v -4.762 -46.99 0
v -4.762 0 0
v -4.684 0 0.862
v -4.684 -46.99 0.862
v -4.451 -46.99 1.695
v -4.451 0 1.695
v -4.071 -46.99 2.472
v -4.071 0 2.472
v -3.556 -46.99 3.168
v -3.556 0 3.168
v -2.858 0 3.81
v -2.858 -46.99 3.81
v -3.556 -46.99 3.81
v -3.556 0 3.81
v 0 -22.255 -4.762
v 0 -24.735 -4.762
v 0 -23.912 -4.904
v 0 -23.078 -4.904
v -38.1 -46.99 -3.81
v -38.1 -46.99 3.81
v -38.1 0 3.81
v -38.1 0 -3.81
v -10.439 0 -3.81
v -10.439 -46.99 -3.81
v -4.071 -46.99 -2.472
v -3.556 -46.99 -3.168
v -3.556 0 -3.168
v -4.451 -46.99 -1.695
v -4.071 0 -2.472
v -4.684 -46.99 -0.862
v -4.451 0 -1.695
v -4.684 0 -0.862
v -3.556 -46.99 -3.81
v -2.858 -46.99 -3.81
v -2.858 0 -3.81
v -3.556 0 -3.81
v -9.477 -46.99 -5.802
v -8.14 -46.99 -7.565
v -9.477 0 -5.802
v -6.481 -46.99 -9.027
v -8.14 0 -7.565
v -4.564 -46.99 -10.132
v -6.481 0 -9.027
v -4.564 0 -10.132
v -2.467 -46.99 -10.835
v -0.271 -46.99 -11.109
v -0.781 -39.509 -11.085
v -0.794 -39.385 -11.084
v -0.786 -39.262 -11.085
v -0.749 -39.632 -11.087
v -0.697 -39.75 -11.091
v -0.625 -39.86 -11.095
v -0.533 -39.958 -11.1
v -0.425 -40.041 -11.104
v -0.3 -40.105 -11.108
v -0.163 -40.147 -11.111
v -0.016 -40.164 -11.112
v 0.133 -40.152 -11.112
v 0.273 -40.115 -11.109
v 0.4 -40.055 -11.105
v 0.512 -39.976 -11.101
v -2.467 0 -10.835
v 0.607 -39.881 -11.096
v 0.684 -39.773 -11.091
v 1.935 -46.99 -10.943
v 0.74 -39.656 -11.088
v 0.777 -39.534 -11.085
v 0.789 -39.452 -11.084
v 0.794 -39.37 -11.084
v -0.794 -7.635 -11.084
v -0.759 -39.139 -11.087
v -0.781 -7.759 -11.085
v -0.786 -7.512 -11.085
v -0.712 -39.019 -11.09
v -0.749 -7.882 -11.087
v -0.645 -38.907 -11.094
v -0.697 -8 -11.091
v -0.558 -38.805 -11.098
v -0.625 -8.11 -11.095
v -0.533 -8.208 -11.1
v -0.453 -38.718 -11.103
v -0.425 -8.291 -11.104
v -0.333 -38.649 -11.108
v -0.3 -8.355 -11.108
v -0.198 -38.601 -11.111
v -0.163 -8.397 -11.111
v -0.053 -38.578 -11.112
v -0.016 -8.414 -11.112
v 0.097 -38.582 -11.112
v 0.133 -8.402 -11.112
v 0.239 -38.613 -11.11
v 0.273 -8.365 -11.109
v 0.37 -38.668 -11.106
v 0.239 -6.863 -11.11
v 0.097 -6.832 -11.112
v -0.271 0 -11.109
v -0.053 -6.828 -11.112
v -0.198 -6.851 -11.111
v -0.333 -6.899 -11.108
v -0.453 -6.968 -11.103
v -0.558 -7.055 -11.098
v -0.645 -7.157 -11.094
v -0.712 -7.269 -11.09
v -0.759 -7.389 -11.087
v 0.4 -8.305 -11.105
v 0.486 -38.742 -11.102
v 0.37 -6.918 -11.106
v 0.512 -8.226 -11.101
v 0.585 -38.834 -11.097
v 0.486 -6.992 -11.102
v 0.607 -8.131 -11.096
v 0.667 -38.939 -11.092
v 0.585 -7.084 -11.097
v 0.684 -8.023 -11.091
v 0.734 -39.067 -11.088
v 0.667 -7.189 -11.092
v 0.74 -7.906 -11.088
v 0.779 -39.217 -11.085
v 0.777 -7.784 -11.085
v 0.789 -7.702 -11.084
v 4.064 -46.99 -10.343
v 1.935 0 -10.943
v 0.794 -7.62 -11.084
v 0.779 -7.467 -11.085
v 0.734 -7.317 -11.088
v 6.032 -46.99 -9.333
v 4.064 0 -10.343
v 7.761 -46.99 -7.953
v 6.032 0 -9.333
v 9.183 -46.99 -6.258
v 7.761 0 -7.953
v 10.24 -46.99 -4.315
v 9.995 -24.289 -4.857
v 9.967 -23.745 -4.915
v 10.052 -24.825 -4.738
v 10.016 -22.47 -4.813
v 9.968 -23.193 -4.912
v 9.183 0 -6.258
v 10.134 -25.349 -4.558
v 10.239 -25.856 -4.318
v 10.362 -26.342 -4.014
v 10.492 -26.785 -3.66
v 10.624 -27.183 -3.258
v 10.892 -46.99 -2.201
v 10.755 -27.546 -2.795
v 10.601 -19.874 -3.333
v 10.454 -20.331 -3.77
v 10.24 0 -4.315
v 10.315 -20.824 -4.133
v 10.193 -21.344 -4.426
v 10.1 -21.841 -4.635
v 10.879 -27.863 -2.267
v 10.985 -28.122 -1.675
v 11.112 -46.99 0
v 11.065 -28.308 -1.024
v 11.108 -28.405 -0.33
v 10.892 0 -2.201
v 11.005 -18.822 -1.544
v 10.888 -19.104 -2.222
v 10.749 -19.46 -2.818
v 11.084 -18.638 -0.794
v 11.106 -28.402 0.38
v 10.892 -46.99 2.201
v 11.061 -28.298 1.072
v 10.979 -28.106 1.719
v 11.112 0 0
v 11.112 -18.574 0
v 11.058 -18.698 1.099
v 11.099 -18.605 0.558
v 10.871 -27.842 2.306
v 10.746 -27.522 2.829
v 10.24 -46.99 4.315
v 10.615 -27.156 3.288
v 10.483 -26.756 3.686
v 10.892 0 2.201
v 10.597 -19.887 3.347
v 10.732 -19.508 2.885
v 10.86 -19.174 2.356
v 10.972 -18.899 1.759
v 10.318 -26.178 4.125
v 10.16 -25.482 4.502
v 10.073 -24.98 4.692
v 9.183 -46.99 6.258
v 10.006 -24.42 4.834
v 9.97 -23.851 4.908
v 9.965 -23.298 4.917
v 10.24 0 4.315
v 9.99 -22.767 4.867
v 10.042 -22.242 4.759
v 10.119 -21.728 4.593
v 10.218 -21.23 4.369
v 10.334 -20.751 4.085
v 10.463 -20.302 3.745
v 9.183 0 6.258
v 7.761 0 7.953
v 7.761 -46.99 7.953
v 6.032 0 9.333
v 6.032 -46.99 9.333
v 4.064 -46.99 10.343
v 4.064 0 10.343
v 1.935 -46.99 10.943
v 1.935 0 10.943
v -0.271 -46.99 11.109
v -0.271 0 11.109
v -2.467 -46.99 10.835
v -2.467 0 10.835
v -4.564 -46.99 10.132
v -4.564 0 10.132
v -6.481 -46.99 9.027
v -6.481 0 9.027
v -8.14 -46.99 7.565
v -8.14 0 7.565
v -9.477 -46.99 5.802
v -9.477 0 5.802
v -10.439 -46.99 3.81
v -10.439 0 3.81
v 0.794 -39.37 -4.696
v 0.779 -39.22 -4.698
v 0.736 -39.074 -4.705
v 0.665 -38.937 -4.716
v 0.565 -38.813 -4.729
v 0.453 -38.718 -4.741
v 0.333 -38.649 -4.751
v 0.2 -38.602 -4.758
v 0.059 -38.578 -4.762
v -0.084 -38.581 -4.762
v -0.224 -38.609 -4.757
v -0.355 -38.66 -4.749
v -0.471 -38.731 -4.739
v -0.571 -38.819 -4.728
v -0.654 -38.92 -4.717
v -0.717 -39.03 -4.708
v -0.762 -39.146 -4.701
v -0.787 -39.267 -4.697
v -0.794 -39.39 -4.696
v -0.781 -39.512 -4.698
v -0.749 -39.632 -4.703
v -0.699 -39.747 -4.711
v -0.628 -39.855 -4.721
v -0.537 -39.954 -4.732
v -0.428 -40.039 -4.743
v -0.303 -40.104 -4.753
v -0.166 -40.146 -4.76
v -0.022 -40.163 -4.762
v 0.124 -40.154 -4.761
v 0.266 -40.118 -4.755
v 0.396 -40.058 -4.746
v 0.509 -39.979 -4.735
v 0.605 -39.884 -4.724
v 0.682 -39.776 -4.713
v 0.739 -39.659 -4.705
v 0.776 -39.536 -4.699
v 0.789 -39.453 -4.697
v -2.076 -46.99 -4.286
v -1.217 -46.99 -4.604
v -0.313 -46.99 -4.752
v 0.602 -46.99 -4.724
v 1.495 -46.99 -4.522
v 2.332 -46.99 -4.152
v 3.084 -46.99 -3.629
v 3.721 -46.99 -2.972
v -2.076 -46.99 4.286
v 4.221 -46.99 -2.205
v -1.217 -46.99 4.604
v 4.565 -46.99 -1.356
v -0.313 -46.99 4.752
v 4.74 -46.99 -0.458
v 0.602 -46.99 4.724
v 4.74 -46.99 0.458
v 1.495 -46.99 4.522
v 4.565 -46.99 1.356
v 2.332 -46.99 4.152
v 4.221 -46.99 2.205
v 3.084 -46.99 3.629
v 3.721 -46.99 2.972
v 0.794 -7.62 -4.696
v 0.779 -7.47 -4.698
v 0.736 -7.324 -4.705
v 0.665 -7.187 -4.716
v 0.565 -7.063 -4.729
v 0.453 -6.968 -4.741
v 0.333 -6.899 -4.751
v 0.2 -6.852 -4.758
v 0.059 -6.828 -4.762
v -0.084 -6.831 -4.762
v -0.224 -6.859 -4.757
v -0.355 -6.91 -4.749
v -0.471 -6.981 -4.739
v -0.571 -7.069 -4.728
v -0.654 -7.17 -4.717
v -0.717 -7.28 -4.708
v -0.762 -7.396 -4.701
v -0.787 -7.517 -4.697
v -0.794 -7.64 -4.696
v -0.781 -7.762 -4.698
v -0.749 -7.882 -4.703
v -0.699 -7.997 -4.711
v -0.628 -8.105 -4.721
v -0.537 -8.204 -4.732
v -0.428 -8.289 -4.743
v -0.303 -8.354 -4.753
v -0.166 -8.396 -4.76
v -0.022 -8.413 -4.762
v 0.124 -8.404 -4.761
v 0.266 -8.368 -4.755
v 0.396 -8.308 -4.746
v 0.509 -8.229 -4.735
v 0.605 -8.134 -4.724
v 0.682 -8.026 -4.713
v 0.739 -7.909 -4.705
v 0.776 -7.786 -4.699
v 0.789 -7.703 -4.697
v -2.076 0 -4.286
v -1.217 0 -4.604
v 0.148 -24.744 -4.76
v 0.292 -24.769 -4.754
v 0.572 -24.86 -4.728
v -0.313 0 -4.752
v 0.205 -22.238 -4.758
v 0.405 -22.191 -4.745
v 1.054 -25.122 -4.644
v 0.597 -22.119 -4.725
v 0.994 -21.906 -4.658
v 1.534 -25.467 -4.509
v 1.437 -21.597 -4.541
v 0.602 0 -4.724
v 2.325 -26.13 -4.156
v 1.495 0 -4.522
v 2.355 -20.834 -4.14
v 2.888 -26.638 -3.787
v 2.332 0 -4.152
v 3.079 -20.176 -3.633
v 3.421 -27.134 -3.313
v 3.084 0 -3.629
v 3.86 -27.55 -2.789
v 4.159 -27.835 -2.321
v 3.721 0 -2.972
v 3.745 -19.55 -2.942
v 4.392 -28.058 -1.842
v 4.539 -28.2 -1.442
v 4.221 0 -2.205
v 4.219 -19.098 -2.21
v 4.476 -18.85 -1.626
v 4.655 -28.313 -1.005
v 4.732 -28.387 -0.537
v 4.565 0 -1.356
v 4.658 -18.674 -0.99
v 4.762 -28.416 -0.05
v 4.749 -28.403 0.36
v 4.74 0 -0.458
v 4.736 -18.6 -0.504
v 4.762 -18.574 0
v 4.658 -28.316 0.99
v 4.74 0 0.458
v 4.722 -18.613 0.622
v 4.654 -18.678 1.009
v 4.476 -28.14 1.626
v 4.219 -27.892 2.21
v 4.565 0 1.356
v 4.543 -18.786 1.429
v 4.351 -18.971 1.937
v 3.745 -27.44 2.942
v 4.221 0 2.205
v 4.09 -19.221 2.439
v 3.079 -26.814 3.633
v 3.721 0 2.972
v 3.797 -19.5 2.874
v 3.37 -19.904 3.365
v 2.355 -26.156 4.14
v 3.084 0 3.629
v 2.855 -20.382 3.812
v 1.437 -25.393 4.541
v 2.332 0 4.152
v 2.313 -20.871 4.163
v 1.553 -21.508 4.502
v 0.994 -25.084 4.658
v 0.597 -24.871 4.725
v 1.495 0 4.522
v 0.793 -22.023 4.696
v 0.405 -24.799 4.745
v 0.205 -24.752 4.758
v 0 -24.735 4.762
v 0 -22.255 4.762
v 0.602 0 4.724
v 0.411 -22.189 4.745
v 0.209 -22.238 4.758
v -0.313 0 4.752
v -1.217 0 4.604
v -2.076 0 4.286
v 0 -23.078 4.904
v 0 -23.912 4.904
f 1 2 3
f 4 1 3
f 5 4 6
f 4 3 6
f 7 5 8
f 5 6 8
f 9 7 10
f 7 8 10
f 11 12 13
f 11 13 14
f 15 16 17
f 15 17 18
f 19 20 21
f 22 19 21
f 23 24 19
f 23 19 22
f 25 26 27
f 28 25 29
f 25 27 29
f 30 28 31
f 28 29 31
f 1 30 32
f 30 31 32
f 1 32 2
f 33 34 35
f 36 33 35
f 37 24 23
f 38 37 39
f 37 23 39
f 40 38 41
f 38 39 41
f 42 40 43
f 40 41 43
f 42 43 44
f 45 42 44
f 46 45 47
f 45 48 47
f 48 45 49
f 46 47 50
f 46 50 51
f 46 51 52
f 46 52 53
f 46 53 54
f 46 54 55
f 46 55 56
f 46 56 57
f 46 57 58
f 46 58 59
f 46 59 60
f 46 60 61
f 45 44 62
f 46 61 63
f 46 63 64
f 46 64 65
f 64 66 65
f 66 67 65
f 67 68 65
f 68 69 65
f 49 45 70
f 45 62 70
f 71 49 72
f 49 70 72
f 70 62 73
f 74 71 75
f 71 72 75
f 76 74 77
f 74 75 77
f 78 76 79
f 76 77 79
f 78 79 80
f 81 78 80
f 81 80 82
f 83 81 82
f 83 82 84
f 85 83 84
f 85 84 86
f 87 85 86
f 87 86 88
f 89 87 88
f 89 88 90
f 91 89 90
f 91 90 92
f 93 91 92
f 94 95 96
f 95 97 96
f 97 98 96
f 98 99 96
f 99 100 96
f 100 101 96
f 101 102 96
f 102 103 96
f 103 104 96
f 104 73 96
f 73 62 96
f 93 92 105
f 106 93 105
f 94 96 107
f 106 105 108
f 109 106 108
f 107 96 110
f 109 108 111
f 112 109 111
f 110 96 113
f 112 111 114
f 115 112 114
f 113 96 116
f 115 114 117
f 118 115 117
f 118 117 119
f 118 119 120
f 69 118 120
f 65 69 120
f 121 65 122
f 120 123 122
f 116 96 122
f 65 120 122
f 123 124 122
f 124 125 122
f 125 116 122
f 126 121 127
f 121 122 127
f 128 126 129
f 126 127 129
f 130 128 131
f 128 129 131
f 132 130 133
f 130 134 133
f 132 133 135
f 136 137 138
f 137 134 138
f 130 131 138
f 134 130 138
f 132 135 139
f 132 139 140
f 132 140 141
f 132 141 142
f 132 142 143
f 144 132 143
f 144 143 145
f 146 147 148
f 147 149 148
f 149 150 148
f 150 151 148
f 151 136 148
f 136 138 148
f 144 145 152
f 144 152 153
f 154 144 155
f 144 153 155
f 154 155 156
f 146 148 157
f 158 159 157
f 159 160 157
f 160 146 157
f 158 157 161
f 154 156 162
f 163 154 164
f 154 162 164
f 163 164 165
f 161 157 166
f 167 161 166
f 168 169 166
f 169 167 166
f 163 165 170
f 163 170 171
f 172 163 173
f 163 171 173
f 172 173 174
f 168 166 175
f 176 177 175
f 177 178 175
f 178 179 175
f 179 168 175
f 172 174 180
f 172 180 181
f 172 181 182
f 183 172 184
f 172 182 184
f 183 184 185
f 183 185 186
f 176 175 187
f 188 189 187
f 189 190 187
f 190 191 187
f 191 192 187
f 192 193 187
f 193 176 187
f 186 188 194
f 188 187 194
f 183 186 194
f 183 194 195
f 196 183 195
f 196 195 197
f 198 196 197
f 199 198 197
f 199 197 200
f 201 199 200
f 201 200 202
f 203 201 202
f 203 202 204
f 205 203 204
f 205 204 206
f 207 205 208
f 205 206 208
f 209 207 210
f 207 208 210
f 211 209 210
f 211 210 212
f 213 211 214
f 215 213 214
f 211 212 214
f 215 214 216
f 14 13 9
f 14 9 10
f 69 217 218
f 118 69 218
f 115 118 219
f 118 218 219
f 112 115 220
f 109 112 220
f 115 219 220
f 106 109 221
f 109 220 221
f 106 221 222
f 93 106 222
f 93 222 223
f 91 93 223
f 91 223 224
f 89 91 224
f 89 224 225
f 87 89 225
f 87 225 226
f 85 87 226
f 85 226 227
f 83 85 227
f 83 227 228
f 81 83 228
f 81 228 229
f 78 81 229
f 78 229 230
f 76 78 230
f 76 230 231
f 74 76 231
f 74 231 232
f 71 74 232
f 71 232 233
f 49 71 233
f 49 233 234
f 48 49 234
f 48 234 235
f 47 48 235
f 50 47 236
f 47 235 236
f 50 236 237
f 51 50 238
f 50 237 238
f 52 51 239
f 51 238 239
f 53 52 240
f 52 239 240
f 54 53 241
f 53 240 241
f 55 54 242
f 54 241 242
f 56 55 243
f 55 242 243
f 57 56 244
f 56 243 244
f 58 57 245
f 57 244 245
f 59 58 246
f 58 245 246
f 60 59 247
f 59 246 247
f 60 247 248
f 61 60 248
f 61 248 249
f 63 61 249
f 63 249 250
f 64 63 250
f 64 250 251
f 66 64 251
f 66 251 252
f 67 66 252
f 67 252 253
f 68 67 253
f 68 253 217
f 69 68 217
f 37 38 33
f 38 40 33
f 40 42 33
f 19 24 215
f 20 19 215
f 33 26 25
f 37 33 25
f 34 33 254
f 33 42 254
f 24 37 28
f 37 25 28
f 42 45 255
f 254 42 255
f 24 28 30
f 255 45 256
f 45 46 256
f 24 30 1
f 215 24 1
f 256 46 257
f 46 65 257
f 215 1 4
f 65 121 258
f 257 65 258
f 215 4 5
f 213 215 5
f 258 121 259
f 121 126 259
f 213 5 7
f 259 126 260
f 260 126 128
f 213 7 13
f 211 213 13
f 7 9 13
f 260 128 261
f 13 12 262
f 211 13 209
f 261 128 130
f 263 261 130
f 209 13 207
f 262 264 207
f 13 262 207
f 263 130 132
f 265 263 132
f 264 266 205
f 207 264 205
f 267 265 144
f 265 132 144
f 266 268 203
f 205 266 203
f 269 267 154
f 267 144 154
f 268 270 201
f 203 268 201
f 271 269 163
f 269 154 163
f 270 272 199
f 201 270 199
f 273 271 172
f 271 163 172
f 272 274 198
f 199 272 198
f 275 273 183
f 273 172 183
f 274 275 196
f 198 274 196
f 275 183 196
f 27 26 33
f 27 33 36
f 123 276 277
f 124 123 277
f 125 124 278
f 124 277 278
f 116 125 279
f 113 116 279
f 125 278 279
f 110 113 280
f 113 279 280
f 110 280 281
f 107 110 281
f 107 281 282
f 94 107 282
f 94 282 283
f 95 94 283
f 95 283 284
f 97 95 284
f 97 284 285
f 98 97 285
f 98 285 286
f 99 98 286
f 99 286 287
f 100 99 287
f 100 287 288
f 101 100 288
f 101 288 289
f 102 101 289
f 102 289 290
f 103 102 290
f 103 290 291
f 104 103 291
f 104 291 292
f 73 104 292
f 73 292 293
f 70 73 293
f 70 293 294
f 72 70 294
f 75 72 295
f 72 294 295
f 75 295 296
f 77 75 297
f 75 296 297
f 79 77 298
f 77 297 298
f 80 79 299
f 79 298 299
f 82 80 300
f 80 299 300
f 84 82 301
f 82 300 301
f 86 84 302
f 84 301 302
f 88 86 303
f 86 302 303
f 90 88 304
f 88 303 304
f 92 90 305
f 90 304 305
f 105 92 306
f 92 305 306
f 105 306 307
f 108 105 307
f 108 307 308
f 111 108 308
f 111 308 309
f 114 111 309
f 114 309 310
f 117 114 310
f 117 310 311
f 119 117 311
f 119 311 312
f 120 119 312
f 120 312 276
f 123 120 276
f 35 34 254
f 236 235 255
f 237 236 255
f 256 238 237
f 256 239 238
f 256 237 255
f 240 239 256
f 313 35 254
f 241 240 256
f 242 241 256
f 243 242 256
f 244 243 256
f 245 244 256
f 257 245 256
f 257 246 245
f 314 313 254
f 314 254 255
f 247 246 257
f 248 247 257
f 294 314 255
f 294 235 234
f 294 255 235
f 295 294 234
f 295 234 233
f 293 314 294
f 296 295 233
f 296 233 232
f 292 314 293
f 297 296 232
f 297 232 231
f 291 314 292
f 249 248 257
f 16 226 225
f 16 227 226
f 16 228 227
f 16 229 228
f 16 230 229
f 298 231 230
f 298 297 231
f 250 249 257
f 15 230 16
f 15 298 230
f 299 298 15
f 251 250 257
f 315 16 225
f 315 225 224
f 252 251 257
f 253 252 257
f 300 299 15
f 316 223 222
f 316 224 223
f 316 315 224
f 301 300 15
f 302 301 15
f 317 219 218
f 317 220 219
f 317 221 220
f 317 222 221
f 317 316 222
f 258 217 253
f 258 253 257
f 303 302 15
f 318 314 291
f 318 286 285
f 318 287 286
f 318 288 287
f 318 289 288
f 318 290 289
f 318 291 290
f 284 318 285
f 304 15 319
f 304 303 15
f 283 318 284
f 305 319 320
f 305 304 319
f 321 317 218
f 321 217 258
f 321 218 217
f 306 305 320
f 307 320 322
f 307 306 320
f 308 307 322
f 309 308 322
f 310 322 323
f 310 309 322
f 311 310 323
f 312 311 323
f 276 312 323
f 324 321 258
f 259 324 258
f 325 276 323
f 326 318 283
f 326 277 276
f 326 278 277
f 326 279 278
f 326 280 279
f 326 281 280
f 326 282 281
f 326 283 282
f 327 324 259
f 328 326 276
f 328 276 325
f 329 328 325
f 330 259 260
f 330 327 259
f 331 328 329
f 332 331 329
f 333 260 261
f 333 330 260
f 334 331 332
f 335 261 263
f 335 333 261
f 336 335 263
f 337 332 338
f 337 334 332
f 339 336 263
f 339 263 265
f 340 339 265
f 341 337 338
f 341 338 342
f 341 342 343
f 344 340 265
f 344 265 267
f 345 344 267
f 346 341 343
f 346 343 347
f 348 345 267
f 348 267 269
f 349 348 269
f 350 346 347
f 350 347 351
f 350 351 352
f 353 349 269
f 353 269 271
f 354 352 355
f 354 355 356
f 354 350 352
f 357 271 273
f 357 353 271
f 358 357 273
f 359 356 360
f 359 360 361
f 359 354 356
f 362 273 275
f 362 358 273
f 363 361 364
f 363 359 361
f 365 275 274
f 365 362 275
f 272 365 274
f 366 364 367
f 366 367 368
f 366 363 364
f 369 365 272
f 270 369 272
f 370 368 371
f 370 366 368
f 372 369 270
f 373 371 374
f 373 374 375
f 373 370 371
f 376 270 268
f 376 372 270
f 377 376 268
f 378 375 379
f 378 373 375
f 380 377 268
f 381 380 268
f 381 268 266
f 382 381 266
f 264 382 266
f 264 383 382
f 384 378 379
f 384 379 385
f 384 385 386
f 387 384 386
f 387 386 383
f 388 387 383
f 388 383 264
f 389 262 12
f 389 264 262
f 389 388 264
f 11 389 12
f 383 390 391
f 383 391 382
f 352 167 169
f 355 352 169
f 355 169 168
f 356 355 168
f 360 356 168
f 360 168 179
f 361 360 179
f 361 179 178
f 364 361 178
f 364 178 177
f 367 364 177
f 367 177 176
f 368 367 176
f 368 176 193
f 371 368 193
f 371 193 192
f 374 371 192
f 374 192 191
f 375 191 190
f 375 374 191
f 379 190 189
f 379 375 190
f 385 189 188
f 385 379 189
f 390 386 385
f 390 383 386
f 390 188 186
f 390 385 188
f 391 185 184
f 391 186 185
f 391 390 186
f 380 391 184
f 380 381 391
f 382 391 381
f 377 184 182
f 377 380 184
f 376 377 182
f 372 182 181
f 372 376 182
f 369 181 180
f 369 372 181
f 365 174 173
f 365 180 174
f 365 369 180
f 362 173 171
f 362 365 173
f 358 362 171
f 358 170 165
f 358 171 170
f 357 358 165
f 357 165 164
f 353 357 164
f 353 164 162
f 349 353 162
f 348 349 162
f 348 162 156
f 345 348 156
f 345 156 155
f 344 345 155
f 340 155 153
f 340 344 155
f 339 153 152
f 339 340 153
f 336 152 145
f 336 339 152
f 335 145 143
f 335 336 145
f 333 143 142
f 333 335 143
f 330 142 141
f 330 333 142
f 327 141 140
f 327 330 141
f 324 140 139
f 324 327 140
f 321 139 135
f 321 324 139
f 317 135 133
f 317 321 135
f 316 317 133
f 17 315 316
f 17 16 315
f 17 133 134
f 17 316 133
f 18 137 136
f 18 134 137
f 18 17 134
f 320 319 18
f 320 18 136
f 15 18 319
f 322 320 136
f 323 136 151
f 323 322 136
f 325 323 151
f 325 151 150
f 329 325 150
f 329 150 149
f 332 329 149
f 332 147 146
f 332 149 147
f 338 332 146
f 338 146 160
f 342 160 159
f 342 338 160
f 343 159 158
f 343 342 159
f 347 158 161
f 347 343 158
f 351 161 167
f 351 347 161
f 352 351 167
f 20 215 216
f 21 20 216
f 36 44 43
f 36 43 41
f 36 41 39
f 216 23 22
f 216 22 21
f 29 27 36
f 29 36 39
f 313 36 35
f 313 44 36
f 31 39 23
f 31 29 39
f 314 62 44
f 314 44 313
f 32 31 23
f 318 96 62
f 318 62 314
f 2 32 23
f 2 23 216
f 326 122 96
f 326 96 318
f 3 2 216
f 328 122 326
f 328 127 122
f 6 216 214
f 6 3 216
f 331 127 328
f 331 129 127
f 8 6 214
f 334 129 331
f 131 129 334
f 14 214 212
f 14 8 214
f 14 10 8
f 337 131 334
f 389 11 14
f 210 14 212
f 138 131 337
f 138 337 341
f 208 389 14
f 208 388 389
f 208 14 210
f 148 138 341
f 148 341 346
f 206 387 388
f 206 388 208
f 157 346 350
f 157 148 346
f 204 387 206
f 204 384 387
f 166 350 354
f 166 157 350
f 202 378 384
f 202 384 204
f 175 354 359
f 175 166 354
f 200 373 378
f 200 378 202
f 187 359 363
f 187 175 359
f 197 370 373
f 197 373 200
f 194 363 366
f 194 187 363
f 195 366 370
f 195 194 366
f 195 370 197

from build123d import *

# Parameters (mm, degrees)
F0_R      = 11.1125
F0_R_2    = 4.7625
F1_DEPTH  = 46.99
F2_W      = 46.99
F2_H      = 7.62
F3_DEPTH  = 38.1
F3_FACE_W = 46.99
F3_FACE_H = 7.62
F4_DEPTH  = 3.556
F5_R      = 0.79375
F6_DEPTH  = 25.4
F7_R      = 4.92125
F8_DEPTH  = 25.4
F10_DEPTH = 46.991


with BuildPart() as f1:
    # F0 (on Front) → F1 (new body)
    with BuildSketch(Plane.XZ):
        Circle(F0_R)
        Circle(F0_R_2, mode=Mode.SUBTRACT)
    extrude(amount=F1_DEPTH)

    # F2 (on Right) → F3 (join)
    with BuildSketch(Plane.YZ):
        with Locations((-23.495, 0)):
            Rectangle(F2_W, F2_H)
    extrude(amount=-F3_DEPTH)

    # F3_face (on face) → F4 (cut)
    with BuildSketch(Plane(origin=(0, -23.495, 0), x_dir=(0, 1, 0), z_dir=(1, 0, 0))):
        Rectangle(F3_FACE_W, F3_FACE_H)
    extrude(amount=-F4_DEPTH, mode=Mode.SUBTRACT)

    # F5 (on Top) → F6 (cut)
    with BuildSketch(Plane.XY):
        with Locations((0, -7.62)):
            Circle(F5_R)
        with Locations((0, -39.37)):
            Circle(F5_R)
    extrude(amount=-F6_DEPTH, mode=Mode.SUBTRACT)

    # F7 (on Right) → F8 (cut)
    with BuildSketch(Plane.YZ):
        with Locations((-23.495, 0)):
            Circle(F7_R)
    extrude(amount=F8_DEPTH, mode=Mode.SUBTRACT)

    # F9 (on face) → F10 (cut, through all)
    with BuildSketch(Plane(origin=(0, 0, 0), x_dir=(-1, 0, 0), z_dir=(0, 1, 0))):
        with BuildLine():
            ThreePointArc((2.8575, 3.81), (-4.7625, 0), (2.8575, -3.81))
            ThreePointArc((2.8575, -3.81), (4.259709, -2.129855), (4.7625, 0))
            ThreePointArc((4.7625, 0), (4.259709, 2.129855), (2.8575, 3.81))
        make_face()
    extrude(amount=-F10_DEPTH, mode=Mode.SUBTRACT)


solid = f1.part
